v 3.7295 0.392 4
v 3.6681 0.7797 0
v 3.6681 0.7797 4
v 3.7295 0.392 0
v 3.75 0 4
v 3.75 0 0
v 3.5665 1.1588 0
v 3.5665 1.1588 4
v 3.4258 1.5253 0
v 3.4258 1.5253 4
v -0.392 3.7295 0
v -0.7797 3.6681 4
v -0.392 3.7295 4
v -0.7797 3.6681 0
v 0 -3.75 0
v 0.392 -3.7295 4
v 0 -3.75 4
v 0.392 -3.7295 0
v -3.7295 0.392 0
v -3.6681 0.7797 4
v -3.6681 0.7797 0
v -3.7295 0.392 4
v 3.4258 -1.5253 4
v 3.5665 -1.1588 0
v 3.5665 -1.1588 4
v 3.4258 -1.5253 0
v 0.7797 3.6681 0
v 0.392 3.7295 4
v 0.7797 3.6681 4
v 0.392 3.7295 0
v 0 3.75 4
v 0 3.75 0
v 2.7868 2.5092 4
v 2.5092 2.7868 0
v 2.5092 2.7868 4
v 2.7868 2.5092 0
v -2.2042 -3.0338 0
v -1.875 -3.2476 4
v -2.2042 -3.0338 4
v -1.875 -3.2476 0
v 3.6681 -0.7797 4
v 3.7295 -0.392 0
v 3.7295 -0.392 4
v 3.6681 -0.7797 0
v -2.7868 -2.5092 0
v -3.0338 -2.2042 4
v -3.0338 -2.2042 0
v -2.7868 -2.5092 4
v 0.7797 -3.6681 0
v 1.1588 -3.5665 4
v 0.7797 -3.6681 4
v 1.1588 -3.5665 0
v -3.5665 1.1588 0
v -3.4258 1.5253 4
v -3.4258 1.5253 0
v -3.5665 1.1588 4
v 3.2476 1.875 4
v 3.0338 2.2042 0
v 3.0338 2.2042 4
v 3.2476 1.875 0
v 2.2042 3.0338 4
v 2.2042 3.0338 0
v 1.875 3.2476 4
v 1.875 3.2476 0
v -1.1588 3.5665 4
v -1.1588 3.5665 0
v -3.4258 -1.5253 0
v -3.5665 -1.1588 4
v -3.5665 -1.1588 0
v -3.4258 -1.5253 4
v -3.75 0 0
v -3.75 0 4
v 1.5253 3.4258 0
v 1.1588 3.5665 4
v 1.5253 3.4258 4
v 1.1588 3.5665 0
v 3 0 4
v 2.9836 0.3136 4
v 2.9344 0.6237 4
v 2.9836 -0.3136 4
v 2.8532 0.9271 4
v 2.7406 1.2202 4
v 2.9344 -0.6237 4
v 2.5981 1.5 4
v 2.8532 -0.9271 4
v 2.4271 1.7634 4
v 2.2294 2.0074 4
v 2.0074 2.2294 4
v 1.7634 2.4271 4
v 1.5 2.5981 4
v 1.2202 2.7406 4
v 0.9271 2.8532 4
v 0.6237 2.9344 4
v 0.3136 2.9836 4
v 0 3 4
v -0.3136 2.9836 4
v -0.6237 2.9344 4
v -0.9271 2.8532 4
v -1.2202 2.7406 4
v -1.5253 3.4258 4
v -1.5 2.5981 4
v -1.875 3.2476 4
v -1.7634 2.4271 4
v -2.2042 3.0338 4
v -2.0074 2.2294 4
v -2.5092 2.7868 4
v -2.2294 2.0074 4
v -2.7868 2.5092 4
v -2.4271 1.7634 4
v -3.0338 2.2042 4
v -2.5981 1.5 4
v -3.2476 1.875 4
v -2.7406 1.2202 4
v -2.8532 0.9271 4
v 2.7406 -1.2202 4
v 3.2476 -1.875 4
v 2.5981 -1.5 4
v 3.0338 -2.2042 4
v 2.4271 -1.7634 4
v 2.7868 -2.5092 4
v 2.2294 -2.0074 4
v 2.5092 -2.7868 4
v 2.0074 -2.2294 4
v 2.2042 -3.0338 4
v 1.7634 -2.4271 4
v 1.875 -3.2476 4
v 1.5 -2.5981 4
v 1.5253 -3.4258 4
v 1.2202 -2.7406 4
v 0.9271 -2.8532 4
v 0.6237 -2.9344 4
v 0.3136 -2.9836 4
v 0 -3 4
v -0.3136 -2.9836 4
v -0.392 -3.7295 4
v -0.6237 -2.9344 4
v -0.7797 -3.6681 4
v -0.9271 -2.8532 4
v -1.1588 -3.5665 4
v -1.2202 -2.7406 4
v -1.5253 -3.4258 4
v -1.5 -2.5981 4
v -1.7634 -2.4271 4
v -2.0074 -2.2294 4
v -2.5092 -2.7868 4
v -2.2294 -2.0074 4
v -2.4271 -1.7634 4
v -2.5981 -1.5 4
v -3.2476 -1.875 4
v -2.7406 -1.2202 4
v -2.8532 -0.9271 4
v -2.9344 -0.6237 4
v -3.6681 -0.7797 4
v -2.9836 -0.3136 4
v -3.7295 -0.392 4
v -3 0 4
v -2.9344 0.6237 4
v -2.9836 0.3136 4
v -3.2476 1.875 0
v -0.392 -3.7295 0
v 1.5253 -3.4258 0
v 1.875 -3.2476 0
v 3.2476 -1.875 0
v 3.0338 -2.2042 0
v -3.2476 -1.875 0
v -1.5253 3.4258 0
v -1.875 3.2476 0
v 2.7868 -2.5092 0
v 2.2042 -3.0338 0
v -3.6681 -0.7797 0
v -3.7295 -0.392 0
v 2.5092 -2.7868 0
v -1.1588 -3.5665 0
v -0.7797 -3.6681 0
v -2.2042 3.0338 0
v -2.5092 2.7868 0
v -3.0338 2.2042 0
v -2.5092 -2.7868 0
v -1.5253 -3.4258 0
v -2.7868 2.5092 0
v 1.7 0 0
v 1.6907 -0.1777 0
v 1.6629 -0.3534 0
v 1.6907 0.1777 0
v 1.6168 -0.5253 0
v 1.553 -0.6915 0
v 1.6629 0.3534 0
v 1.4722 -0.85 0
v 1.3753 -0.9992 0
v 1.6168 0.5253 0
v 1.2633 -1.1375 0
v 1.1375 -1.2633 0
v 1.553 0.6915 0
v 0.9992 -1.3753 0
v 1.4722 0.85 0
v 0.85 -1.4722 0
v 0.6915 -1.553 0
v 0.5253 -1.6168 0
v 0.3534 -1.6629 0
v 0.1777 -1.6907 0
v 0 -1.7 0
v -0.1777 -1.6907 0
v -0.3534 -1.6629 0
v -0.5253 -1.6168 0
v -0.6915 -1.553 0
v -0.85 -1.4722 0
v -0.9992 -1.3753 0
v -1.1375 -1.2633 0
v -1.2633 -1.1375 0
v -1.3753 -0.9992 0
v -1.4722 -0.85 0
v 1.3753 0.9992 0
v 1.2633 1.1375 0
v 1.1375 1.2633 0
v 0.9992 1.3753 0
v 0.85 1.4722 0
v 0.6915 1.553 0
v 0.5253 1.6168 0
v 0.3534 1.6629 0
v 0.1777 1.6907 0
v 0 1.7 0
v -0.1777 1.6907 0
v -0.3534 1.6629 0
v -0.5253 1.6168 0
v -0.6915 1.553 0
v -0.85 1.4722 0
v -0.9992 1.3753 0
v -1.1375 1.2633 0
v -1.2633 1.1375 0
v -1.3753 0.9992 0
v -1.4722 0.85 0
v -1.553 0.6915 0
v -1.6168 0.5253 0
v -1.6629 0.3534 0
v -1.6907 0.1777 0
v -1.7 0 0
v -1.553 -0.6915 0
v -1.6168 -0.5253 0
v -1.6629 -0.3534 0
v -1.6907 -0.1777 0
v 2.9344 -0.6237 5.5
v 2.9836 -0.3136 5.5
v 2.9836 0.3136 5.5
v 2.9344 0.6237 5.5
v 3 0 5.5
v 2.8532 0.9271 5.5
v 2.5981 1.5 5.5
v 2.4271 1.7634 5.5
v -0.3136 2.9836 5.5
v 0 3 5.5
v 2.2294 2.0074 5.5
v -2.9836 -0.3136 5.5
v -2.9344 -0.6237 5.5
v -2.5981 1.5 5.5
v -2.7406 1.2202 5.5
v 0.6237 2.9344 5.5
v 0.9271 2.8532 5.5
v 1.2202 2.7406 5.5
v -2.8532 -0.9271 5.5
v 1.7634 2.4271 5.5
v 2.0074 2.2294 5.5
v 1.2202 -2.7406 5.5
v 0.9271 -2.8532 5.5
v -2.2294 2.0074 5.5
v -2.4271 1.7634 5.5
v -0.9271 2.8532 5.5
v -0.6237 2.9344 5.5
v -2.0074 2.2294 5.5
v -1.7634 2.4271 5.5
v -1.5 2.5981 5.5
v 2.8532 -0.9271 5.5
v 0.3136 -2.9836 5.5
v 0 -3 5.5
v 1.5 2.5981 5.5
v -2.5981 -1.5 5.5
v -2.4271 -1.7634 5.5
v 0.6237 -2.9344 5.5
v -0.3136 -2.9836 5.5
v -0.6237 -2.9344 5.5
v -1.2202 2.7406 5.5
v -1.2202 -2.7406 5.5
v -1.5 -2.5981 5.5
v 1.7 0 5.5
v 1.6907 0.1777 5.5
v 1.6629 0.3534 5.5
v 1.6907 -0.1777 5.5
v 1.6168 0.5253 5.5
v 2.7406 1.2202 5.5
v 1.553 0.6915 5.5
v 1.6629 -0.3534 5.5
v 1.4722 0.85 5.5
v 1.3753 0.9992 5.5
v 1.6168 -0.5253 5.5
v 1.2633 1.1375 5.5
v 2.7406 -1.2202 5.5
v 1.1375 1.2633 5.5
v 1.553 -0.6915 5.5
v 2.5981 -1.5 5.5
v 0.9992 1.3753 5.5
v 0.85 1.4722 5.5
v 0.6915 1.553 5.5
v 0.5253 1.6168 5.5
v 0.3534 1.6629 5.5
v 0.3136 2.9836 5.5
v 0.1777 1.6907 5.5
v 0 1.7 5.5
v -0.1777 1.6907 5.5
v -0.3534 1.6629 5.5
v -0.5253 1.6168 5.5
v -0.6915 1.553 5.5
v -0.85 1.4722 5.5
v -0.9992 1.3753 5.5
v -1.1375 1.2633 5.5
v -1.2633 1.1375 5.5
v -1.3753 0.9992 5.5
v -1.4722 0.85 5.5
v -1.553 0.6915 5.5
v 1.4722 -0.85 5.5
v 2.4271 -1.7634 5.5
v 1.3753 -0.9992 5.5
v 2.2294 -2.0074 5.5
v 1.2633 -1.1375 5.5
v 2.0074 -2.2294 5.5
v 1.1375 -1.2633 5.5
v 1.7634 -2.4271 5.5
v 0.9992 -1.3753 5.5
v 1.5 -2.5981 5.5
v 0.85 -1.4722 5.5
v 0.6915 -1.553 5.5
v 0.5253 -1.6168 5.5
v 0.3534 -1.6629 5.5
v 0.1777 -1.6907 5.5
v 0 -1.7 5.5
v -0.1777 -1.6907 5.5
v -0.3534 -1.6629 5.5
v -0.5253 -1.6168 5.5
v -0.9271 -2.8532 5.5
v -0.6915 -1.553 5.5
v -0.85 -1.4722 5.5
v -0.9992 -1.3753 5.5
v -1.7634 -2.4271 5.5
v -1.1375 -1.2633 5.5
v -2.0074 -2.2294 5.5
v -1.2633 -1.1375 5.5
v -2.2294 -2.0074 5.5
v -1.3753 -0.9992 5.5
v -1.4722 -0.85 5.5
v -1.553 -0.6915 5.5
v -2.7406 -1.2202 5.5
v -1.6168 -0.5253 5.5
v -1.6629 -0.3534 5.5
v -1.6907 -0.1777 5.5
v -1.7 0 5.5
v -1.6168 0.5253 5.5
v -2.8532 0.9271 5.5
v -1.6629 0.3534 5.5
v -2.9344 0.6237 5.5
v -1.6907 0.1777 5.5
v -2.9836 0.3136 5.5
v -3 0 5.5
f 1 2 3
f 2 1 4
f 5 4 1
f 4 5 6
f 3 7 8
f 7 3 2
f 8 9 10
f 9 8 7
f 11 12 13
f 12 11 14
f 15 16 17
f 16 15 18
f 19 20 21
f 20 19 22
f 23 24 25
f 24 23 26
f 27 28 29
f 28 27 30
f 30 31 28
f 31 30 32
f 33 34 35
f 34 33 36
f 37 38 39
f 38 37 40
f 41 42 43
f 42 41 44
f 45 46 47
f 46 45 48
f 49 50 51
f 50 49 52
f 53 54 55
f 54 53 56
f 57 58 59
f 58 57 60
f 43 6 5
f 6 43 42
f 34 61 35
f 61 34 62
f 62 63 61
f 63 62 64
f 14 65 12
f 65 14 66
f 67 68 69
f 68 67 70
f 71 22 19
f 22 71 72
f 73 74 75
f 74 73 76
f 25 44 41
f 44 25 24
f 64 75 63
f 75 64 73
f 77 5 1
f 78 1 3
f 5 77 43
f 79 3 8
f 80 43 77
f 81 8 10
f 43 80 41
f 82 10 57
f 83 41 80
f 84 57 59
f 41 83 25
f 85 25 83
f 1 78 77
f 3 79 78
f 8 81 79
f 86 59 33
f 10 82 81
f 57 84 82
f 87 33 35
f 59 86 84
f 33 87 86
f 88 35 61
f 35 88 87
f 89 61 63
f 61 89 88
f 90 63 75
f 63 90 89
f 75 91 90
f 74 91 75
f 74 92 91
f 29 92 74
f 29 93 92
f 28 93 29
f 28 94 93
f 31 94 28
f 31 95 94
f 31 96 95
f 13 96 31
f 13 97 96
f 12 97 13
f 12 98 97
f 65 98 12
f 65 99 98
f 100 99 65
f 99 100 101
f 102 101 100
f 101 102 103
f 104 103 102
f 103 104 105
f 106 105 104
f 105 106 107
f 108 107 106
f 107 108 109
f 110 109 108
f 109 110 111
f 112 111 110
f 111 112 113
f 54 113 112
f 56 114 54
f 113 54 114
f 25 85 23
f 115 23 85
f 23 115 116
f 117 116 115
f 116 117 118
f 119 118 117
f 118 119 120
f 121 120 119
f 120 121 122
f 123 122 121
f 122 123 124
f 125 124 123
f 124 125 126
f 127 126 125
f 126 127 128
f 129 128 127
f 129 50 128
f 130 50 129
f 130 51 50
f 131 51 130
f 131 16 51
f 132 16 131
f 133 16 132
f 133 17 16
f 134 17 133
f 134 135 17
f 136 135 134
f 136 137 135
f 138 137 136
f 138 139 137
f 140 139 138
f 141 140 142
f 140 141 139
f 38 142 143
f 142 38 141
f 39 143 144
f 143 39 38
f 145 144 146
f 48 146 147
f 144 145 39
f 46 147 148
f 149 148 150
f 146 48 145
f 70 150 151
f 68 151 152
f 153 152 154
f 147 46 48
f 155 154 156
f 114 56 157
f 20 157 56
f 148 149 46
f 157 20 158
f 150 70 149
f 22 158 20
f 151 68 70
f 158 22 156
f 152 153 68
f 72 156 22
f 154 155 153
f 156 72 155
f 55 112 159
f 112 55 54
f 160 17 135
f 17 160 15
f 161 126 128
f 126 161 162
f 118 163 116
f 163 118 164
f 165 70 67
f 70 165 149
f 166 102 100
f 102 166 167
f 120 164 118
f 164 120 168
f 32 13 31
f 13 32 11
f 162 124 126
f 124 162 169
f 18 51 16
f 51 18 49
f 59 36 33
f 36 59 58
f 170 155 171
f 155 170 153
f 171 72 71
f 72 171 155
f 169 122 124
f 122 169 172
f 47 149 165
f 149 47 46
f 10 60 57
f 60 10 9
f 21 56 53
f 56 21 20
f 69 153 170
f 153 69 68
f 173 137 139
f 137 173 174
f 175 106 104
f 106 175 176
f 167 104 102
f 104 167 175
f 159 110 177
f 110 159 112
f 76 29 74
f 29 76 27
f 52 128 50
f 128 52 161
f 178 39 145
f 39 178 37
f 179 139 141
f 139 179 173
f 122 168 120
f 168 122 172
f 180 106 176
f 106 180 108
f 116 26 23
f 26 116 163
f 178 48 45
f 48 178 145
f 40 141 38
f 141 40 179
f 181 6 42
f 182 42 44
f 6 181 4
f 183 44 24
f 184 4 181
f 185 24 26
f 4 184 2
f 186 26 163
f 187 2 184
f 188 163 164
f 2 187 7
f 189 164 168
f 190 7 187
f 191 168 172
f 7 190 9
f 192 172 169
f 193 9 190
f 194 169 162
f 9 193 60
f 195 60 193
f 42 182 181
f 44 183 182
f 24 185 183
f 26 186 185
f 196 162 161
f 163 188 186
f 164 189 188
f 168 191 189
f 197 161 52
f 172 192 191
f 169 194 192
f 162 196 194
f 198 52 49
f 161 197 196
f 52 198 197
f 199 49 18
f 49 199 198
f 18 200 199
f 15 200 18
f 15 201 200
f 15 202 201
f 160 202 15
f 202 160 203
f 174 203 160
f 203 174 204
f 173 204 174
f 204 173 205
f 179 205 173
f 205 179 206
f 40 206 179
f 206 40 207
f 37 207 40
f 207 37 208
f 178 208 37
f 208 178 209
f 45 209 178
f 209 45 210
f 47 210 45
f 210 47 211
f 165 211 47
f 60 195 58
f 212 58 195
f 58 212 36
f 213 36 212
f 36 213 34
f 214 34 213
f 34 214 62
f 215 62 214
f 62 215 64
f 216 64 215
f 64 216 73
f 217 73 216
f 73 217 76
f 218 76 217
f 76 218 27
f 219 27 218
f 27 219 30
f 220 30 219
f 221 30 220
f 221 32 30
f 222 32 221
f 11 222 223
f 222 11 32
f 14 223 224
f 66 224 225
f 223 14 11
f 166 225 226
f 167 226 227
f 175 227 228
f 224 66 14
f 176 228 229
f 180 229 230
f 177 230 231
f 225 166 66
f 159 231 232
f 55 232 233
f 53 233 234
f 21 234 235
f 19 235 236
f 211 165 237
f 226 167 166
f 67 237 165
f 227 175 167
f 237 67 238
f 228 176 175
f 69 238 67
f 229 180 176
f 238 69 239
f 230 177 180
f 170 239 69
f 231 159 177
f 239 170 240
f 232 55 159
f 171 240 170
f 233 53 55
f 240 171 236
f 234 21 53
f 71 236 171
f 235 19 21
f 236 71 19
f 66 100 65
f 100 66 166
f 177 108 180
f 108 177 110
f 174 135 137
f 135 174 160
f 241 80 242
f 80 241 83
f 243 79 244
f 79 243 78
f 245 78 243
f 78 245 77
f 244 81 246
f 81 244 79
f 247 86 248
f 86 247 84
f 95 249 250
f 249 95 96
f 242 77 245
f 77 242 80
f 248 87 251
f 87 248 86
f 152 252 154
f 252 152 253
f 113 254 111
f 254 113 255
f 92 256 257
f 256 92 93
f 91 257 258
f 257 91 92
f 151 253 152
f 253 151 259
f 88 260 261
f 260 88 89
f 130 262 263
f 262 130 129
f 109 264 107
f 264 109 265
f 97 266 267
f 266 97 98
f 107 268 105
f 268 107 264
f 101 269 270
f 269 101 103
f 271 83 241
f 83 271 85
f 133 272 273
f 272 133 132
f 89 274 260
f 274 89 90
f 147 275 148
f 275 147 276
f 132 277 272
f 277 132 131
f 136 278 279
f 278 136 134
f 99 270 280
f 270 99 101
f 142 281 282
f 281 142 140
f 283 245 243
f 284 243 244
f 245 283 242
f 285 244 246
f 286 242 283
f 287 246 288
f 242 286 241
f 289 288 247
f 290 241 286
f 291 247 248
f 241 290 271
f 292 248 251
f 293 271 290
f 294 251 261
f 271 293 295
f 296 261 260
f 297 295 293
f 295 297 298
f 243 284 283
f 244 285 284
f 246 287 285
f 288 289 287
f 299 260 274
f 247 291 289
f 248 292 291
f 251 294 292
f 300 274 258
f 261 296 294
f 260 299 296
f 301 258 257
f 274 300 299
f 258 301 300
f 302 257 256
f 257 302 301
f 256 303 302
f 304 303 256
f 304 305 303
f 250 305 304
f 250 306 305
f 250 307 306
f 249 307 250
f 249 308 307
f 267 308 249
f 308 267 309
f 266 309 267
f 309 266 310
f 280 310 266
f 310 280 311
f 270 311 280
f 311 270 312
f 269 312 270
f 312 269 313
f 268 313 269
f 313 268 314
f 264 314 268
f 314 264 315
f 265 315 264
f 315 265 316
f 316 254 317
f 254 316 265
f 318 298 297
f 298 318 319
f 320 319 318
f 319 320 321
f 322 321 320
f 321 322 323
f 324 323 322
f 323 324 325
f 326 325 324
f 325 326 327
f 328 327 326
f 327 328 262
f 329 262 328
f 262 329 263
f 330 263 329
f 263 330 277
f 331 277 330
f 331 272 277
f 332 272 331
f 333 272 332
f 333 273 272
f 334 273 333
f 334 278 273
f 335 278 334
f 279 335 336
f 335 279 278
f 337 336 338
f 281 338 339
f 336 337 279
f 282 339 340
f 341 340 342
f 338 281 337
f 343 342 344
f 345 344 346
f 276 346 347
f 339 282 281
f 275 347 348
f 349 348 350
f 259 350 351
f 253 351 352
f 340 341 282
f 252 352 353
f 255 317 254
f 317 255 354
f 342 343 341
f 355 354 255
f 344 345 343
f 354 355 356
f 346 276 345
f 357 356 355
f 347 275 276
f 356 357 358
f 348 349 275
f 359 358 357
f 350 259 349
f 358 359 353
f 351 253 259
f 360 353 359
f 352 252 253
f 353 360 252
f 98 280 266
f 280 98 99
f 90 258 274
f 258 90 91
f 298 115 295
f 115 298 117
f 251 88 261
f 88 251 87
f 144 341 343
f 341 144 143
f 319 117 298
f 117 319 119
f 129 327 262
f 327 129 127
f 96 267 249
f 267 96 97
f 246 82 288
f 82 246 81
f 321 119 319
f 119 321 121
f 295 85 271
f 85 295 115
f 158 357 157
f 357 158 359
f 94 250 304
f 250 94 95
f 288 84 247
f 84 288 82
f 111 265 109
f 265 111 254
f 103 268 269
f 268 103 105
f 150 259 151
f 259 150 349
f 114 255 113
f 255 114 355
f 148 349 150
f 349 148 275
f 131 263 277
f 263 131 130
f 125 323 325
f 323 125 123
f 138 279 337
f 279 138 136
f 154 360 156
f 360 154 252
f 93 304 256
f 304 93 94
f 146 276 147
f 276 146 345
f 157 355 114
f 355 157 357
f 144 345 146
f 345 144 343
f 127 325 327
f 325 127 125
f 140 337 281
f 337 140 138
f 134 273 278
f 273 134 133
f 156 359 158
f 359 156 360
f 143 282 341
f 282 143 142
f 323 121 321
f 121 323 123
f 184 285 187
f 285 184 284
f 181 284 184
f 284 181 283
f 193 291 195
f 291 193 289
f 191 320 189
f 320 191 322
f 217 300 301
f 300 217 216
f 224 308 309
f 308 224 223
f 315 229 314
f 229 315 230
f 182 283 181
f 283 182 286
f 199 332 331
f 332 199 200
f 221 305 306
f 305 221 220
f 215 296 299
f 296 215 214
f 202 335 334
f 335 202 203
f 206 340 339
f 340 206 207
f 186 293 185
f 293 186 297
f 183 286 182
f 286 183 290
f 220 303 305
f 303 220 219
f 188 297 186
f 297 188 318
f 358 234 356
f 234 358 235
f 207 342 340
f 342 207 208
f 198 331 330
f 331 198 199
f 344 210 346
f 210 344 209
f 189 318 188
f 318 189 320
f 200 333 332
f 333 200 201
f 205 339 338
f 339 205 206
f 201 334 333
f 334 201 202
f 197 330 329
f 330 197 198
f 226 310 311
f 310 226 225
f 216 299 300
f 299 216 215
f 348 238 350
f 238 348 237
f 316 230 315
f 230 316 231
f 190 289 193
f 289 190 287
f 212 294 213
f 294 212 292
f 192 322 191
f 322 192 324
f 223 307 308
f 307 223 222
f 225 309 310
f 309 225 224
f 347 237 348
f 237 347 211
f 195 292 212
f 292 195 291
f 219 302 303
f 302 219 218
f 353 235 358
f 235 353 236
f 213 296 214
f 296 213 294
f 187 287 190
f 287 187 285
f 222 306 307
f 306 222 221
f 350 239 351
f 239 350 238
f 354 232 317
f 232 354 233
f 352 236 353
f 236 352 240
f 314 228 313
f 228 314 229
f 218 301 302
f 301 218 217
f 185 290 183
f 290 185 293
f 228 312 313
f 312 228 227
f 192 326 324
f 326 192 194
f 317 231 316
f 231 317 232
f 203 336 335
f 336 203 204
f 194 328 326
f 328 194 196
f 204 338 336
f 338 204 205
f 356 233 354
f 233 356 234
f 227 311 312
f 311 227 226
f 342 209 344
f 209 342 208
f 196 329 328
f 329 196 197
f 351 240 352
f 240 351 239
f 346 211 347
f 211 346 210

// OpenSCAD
$fn = 60;
difference() {
  union() {
    cylinder(d = 7.5, h = 4);
    translate([0, 0, 4])
      cylinder(d = 6, h = 1.5);
  }
  
  translate([0, 0, -1])
    cylinder(d = 3.4, h = 8);
}
